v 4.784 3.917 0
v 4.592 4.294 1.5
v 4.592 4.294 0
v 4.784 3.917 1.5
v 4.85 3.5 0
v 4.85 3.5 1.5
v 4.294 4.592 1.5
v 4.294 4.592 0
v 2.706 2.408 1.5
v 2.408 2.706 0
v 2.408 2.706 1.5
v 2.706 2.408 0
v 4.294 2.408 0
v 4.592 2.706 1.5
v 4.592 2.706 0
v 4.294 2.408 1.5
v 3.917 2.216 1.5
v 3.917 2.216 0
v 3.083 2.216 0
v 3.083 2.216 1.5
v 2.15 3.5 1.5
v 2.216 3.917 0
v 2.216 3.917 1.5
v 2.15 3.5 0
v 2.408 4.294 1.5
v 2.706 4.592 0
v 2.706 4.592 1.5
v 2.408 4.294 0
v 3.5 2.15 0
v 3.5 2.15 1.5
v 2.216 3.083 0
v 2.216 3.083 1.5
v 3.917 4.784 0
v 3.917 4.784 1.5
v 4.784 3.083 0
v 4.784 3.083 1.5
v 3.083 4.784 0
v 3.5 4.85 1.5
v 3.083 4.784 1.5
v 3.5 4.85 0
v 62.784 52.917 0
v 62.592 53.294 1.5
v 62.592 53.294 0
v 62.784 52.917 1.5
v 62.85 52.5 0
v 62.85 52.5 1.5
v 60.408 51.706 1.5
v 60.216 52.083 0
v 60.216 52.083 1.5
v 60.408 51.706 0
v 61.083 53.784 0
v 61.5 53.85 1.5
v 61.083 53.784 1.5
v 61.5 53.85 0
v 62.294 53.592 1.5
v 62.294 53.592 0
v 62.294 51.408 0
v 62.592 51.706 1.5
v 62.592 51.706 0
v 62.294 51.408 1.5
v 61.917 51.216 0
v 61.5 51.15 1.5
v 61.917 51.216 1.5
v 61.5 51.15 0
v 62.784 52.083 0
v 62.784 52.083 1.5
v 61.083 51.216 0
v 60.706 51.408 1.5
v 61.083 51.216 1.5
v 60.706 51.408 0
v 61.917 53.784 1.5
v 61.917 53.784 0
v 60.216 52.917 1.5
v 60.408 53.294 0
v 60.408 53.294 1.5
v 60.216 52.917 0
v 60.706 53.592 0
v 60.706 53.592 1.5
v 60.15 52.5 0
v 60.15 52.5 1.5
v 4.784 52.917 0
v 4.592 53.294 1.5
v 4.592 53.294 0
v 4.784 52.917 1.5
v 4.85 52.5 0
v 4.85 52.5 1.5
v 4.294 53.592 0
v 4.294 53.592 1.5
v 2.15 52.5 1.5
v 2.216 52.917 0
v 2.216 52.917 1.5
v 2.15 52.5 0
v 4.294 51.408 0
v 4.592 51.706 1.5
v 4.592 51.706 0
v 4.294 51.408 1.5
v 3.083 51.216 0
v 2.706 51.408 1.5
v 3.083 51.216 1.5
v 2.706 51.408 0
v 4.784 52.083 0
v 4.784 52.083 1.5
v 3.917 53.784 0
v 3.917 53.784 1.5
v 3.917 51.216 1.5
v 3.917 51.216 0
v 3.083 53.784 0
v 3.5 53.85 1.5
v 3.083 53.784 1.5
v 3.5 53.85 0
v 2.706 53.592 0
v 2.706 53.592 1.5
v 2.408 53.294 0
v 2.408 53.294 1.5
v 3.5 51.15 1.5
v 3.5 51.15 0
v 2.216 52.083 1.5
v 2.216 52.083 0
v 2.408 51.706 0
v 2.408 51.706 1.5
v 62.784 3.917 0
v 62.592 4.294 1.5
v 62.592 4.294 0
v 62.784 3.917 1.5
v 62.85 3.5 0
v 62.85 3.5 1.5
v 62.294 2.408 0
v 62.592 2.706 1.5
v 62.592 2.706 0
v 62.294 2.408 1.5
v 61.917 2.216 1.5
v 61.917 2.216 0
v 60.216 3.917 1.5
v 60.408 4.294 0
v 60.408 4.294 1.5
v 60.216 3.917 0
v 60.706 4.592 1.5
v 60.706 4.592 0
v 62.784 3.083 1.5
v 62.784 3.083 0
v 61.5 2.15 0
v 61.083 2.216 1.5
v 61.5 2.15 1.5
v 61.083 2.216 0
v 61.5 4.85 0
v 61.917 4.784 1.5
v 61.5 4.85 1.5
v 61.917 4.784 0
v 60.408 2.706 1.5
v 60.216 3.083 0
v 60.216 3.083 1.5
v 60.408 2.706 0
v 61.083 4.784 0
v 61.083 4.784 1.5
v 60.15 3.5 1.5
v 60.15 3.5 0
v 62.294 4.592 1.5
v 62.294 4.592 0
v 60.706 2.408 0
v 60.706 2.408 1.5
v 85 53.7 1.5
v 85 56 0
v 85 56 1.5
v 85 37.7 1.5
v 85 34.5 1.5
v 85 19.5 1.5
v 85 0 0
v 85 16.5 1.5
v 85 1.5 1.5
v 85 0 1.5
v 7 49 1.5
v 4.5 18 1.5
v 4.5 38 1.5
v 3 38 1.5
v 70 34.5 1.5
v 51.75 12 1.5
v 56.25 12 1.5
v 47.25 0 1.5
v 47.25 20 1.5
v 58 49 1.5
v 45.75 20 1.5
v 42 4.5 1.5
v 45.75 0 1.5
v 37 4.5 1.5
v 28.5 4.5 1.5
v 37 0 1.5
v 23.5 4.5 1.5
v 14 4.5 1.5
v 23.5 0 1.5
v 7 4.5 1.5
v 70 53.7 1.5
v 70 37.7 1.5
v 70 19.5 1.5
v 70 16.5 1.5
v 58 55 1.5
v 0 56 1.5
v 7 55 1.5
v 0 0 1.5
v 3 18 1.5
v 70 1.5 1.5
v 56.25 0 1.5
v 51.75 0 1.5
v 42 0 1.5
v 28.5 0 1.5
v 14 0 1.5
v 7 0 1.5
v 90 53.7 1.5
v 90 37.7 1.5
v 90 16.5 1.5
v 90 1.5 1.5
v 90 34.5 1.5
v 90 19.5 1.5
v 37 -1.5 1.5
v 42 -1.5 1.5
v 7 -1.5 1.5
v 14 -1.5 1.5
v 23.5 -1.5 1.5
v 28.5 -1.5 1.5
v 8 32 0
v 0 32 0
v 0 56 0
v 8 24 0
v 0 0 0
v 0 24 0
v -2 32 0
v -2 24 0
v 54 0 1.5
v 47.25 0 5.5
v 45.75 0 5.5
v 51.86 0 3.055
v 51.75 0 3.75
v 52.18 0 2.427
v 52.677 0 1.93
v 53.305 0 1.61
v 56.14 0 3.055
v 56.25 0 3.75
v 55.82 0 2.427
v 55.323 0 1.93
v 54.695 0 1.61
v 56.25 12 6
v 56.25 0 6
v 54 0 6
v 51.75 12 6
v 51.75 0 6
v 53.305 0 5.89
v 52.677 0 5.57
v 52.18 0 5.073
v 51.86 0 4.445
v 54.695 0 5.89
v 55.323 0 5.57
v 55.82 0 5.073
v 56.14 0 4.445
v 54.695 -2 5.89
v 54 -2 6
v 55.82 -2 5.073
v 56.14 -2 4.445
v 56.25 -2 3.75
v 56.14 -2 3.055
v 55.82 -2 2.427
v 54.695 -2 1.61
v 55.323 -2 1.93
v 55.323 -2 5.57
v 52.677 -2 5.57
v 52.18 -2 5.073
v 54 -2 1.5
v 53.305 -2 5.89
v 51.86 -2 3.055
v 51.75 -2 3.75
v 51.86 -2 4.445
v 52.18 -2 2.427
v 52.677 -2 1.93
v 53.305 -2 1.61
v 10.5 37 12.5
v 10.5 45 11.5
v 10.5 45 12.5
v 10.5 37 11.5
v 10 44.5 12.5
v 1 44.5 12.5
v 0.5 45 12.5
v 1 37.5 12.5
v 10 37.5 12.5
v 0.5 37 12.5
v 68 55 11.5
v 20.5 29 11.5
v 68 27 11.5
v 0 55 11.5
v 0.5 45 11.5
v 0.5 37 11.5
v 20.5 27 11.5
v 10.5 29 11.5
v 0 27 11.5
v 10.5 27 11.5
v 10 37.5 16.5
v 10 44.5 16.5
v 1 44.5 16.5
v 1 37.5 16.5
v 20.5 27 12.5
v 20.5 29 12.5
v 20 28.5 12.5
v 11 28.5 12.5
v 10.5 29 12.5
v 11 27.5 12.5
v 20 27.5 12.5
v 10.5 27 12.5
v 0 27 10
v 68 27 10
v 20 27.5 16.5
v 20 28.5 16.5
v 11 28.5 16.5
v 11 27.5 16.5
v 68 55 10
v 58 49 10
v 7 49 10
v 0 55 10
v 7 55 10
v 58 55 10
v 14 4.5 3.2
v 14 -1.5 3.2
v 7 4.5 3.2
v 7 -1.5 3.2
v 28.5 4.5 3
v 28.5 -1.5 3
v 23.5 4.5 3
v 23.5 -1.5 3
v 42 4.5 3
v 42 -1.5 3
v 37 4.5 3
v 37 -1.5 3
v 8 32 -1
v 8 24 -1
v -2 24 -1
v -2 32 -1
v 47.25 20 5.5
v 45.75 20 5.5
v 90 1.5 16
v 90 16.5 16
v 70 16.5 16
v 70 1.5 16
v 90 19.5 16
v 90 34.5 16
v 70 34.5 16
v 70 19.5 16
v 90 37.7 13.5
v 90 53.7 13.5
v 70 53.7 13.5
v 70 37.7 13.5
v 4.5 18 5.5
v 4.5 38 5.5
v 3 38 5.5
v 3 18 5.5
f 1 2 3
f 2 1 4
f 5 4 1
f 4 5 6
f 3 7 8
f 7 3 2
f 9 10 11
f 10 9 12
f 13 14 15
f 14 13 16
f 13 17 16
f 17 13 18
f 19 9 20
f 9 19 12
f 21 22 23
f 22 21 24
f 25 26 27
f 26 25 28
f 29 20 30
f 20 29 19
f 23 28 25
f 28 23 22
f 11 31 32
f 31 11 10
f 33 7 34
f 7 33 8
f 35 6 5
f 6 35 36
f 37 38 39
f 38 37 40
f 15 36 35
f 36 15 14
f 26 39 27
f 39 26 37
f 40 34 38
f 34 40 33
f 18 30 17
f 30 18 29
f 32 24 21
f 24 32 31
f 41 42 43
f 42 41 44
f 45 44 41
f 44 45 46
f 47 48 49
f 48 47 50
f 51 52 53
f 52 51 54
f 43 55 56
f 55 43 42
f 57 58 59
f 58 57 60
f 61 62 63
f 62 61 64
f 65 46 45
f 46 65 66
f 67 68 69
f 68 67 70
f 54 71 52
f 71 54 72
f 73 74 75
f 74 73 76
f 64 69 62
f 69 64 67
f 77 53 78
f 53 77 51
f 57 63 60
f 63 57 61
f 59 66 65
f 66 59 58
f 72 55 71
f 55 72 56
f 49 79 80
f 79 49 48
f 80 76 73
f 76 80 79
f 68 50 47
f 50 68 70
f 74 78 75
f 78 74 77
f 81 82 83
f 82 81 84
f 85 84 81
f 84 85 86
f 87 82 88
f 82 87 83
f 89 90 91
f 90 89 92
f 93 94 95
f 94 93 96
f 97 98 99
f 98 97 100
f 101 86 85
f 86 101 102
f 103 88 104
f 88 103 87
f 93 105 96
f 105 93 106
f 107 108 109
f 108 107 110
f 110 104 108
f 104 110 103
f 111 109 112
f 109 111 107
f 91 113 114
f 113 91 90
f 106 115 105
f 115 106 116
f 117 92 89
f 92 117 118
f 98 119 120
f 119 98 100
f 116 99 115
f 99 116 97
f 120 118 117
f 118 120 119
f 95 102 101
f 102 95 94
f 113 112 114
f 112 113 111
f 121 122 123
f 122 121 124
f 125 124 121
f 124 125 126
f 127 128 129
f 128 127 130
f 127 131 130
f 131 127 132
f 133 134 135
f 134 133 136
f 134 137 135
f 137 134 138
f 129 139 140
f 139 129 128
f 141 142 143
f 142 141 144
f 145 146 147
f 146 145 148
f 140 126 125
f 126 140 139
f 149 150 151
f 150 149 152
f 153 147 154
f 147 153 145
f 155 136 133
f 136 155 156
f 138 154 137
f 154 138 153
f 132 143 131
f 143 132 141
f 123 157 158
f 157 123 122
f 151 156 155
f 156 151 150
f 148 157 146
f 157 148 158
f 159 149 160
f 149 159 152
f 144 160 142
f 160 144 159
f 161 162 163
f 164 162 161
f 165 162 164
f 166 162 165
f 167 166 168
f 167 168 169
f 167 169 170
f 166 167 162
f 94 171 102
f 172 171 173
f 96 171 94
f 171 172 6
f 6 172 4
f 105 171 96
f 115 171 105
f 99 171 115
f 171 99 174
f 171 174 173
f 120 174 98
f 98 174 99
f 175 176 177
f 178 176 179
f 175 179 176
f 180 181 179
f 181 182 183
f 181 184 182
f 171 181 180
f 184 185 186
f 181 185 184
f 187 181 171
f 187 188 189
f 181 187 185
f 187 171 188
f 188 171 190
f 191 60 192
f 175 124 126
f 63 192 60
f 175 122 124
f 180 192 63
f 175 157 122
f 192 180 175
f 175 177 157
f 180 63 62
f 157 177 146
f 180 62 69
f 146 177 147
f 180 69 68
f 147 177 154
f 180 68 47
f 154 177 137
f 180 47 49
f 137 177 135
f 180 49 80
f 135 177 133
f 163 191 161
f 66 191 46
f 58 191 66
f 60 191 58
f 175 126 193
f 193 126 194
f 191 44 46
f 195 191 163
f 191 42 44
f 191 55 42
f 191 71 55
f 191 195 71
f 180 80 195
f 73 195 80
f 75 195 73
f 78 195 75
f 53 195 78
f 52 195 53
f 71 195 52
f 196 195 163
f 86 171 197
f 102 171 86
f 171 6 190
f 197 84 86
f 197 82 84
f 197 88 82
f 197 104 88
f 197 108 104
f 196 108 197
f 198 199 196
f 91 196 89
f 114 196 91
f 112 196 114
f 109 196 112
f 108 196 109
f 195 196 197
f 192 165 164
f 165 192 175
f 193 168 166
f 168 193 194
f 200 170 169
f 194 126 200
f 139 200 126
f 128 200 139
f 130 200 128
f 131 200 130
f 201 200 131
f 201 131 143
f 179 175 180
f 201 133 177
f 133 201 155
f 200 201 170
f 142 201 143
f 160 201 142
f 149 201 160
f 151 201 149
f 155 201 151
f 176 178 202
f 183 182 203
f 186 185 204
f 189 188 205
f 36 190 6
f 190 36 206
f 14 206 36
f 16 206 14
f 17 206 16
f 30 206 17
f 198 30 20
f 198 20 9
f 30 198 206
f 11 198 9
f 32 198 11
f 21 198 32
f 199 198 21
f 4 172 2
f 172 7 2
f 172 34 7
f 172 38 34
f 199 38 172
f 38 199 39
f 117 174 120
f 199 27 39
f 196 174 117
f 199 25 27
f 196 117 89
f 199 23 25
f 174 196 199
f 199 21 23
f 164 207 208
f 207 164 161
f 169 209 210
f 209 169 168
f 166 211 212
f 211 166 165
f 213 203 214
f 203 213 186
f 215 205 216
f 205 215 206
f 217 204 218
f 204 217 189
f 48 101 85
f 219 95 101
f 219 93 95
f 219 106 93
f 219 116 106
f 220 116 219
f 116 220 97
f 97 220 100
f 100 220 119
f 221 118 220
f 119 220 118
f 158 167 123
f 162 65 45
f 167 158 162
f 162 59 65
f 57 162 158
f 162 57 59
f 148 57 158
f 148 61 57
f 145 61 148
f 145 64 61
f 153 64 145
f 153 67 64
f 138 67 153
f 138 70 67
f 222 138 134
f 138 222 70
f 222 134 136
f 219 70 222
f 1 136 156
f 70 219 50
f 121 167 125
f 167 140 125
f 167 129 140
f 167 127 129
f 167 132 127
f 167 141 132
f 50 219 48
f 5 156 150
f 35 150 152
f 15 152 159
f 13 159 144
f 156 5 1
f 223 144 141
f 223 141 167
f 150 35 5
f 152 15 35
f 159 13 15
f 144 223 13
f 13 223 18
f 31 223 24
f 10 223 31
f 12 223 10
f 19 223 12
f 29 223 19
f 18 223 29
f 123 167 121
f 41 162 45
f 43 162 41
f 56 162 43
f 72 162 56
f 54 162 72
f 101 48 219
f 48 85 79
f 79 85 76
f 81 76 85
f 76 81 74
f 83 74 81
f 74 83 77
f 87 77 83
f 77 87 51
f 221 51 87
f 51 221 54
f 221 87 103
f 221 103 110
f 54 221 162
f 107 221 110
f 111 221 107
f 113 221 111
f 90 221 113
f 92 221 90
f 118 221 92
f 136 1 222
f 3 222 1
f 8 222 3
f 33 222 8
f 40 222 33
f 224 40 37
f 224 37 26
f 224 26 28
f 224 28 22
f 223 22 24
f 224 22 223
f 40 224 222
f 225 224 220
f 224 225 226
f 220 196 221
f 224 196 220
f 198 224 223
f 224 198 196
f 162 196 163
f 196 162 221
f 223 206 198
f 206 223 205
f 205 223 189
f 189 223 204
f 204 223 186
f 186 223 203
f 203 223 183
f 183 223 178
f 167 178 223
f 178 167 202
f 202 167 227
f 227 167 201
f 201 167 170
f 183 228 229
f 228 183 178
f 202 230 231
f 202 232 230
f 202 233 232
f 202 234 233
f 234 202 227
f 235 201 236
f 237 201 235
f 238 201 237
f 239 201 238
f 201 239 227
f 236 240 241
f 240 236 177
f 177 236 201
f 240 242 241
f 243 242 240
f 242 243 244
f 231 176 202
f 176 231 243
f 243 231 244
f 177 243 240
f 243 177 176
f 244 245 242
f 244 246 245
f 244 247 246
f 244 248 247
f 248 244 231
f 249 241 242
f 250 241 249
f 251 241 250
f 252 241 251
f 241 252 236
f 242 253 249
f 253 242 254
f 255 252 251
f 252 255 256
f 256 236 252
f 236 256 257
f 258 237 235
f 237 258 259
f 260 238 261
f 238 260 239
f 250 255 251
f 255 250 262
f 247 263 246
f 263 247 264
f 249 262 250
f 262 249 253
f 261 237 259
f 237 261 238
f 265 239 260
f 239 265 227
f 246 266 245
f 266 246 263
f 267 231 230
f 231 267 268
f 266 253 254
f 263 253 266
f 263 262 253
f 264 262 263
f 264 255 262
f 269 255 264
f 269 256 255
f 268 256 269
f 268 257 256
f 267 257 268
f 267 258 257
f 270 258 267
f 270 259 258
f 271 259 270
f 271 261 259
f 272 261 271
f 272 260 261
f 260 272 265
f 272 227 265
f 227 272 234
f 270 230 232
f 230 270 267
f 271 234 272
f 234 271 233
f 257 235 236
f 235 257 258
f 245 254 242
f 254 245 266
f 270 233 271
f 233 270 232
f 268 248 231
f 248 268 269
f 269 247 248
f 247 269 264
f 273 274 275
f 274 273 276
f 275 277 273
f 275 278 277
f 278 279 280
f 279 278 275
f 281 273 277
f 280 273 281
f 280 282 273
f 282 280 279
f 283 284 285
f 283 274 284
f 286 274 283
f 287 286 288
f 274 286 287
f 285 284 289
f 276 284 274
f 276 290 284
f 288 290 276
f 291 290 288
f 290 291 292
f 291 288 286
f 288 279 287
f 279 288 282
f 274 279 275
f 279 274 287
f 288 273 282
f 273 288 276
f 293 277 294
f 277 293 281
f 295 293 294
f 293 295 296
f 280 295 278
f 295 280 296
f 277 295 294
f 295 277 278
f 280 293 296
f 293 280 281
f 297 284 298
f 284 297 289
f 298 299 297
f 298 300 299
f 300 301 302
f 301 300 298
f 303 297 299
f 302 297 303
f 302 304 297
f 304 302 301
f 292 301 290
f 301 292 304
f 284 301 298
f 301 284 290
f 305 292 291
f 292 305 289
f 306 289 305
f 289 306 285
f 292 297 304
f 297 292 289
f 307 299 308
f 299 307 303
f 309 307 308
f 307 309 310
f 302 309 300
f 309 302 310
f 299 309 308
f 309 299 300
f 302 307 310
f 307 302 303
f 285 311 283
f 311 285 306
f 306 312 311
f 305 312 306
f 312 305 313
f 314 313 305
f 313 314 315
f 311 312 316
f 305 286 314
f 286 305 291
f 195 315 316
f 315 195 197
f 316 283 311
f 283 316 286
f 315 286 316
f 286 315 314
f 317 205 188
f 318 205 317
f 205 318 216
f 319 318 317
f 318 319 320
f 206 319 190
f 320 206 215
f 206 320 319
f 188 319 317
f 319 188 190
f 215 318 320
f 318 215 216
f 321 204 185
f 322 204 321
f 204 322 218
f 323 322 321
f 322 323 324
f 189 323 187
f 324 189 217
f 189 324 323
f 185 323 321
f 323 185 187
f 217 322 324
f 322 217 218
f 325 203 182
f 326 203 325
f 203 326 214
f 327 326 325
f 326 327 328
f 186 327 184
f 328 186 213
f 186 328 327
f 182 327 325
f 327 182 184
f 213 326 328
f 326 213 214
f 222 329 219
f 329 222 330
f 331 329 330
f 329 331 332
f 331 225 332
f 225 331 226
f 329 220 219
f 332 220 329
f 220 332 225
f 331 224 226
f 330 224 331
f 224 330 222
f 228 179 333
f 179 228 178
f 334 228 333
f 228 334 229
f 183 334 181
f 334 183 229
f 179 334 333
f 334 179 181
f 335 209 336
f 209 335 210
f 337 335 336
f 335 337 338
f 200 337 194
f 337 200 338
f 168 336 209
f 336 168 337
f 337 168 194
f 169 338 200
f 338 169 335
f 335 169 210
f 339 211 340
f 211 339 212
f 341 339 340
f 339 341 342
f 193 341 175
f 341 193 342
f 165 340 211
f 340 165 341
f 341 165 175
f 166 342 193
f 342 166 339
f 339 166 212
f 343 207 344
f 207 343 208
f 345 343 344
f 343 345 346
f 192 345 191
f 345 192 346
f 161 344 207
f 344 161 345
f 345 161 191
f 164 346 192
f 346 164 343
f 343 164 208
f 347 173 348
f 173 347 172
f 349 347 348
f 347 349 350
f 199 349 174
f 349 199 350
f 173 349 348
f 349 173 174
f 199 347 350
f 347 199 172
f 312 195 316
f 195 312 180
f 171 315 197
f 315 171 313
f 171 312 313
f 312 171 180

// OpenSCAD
$fn = 20;

module RPi4() {
	boardDepth = 56;
	boardWidth = 85;
	UsbAndEthernetOffset = boardWidth - 15;

	BaseBoard();
	translate([7, -1.5, baseBoardHeight]) UsbC();
	translate([3.5 + 7.7 + 14.8 - HdmiMiniWidth/2, -1.5, baseBoardHeight]) HdmiMini();
	translate([3.5 + 7.7 + 14.8 + 13.5 - HdmiMiniWidth/2, -1.5, baseBoardHeight]) HdmiMini();

	//SD
	translate([-2,boardDepth/2-sdDepth/2, -sdHeight]) SdCard();

	//Camera Ribbon Cable
	translate([3.5 + 7.7 + 14.8 + 13.5 + 7- RibbonHeaderWidth/2, 0, baseBoardHeight]) RibbonHeader();

	translate([3.5 + 7.7 + 14.8 + 13.5 + 7 + 7.5 - HeadphoneJackWidth/2, 0, baseBoardHeight]) HeadphoneJack();
	translate([UsbAndEthernetOffset, 9 - UsbADepth/2, baseBoardHeight]) UsbA();
	translate([UsbAndEthernetOffset, 27 - UsbADepth/2, baseBoardHeight]) UsbA();
	translate([UsbAndEthernetOffset, 45.7 - EthernetDepth/2, baseBoardHeight]) Ethernet();

	//Diplay Ribbon Cable
	translate([3,HoleOffset+24.5-RibbonHeaderDepth/2, baseBoardHeight]) RibbonHeader();

	//GPIO
	GPIOHeight = 8.5;
	GPIODepth = 6;
	senseHatDepth = 28;

	translate([7, 49, baseBoardHeight]) GPIO();
	translate([0, 49+GPIODepth-senseHatDepth, baseBoardHeight + GPIOHeight]) SenseHat();

	baseBoardHeight = 1.5;
	RPiColor = "Green";
	HoleOffset = 3.5;
	module BaseBoard() {
		color( c = RPiColor) {
			difference() { 
				cube([85, 56, baseBoardHeight]);
				Holes(HoleOffset, HoleOffset);
			}
		}
	}

	HoleDistance = 58;
	module Holes(bottomLeftX, bottomLeftY) {
		translate([bottomLeftX, bottomLeftY, 0]) {
			Hole(0,0,0);
			Hole(HoleDistance, 49, 0);
			Hole(0, 49, 0);
			Hole(HoleDistance, 0, 0);
		}
	}

	module Hole(x, y, z) {
		translate([x, y, z-5]) {
			cylinder(d=2.7, h=10);
		}
	};

	module UsbC() {
		cube([7, 6, 3.2-baseBoardHeight]);
	}

	HdmiMiniWidth = 5;
	module HdmiMini() {
		cube([5, 6, 3.0-baseBoardHeight]);
	}

	RibbonHeaderWidth = 1.5;
	RibbonHeaderDepth = 20;
	RibbonHeaderColor = "Cornsilk";
	module RibbonHeader() {
		color(RibbonHeaderColor) {
			cube([RibbonHeaderWidth, RibbonHeaderDepth, 5.5-baseBoardHeight]);
		}
	}

	HeadphoneJackWidth = 4.5;
	module HeadphoneJack() {
		cube([HeadphoneJackWidth, 12, 6-baseBoardHeight]);
		translate([HeadphoneJackWidth/2, 0, HeadphoneJackWidth/2]) rotate([90,0,0]) cylinder(d=HeadphoneJackWidth, h=2);
	}

	UsbADepth = 15;
	module UsbA() {
		cube([20, UsbADepth, 16-baseBoardHeight]);
	}

	EthernetDepth = 16;
	EthernetWidth = 20;
	module Ethernet() {
		cube([EthernetWidth, EthernetDepth, 13.5-baseBoardHeight]);
	}

	module GPIO() {
		color("black") cube([HoleDistance - 3.5*2, GPIODepth, GPIOHeight]);
	}

	module SenseHat() {
		color("blue") cube([UsbAndEthernetOffset-2, senseHatDepth, baseBoardHeight]);
		headerDepth = 8;
		headerWidth = 10;
		xOffset = 0.5;
		translate([xOffset, senseHatDepth/2 - headerDepth/2, baseBoardHeight]) {
			color("yellow") cube([headerWidth, headerDepth, 1]);
			translate([0.5, 0.5]) color("grey") cube([headerWidth-1, headerDepth-1, 5]);
		}
		smallHeaderDepth = 2;
		translate([headerWidth + xOffset ,0,baseBoardHeight]) {
			color("yellow") cube([headerWidth, smallHeaderDepth, 1]);
			translate([0.5, 0.5]) color("grey") cube([headerWidth-1, smallHeaderDepth-1, 5]);
		}
	}

	sdDepth = 8;
	sdHeight = 1;
	module SdCard() {
		cube([10, sdDepth, 1]);
	}
}
RPi4();
